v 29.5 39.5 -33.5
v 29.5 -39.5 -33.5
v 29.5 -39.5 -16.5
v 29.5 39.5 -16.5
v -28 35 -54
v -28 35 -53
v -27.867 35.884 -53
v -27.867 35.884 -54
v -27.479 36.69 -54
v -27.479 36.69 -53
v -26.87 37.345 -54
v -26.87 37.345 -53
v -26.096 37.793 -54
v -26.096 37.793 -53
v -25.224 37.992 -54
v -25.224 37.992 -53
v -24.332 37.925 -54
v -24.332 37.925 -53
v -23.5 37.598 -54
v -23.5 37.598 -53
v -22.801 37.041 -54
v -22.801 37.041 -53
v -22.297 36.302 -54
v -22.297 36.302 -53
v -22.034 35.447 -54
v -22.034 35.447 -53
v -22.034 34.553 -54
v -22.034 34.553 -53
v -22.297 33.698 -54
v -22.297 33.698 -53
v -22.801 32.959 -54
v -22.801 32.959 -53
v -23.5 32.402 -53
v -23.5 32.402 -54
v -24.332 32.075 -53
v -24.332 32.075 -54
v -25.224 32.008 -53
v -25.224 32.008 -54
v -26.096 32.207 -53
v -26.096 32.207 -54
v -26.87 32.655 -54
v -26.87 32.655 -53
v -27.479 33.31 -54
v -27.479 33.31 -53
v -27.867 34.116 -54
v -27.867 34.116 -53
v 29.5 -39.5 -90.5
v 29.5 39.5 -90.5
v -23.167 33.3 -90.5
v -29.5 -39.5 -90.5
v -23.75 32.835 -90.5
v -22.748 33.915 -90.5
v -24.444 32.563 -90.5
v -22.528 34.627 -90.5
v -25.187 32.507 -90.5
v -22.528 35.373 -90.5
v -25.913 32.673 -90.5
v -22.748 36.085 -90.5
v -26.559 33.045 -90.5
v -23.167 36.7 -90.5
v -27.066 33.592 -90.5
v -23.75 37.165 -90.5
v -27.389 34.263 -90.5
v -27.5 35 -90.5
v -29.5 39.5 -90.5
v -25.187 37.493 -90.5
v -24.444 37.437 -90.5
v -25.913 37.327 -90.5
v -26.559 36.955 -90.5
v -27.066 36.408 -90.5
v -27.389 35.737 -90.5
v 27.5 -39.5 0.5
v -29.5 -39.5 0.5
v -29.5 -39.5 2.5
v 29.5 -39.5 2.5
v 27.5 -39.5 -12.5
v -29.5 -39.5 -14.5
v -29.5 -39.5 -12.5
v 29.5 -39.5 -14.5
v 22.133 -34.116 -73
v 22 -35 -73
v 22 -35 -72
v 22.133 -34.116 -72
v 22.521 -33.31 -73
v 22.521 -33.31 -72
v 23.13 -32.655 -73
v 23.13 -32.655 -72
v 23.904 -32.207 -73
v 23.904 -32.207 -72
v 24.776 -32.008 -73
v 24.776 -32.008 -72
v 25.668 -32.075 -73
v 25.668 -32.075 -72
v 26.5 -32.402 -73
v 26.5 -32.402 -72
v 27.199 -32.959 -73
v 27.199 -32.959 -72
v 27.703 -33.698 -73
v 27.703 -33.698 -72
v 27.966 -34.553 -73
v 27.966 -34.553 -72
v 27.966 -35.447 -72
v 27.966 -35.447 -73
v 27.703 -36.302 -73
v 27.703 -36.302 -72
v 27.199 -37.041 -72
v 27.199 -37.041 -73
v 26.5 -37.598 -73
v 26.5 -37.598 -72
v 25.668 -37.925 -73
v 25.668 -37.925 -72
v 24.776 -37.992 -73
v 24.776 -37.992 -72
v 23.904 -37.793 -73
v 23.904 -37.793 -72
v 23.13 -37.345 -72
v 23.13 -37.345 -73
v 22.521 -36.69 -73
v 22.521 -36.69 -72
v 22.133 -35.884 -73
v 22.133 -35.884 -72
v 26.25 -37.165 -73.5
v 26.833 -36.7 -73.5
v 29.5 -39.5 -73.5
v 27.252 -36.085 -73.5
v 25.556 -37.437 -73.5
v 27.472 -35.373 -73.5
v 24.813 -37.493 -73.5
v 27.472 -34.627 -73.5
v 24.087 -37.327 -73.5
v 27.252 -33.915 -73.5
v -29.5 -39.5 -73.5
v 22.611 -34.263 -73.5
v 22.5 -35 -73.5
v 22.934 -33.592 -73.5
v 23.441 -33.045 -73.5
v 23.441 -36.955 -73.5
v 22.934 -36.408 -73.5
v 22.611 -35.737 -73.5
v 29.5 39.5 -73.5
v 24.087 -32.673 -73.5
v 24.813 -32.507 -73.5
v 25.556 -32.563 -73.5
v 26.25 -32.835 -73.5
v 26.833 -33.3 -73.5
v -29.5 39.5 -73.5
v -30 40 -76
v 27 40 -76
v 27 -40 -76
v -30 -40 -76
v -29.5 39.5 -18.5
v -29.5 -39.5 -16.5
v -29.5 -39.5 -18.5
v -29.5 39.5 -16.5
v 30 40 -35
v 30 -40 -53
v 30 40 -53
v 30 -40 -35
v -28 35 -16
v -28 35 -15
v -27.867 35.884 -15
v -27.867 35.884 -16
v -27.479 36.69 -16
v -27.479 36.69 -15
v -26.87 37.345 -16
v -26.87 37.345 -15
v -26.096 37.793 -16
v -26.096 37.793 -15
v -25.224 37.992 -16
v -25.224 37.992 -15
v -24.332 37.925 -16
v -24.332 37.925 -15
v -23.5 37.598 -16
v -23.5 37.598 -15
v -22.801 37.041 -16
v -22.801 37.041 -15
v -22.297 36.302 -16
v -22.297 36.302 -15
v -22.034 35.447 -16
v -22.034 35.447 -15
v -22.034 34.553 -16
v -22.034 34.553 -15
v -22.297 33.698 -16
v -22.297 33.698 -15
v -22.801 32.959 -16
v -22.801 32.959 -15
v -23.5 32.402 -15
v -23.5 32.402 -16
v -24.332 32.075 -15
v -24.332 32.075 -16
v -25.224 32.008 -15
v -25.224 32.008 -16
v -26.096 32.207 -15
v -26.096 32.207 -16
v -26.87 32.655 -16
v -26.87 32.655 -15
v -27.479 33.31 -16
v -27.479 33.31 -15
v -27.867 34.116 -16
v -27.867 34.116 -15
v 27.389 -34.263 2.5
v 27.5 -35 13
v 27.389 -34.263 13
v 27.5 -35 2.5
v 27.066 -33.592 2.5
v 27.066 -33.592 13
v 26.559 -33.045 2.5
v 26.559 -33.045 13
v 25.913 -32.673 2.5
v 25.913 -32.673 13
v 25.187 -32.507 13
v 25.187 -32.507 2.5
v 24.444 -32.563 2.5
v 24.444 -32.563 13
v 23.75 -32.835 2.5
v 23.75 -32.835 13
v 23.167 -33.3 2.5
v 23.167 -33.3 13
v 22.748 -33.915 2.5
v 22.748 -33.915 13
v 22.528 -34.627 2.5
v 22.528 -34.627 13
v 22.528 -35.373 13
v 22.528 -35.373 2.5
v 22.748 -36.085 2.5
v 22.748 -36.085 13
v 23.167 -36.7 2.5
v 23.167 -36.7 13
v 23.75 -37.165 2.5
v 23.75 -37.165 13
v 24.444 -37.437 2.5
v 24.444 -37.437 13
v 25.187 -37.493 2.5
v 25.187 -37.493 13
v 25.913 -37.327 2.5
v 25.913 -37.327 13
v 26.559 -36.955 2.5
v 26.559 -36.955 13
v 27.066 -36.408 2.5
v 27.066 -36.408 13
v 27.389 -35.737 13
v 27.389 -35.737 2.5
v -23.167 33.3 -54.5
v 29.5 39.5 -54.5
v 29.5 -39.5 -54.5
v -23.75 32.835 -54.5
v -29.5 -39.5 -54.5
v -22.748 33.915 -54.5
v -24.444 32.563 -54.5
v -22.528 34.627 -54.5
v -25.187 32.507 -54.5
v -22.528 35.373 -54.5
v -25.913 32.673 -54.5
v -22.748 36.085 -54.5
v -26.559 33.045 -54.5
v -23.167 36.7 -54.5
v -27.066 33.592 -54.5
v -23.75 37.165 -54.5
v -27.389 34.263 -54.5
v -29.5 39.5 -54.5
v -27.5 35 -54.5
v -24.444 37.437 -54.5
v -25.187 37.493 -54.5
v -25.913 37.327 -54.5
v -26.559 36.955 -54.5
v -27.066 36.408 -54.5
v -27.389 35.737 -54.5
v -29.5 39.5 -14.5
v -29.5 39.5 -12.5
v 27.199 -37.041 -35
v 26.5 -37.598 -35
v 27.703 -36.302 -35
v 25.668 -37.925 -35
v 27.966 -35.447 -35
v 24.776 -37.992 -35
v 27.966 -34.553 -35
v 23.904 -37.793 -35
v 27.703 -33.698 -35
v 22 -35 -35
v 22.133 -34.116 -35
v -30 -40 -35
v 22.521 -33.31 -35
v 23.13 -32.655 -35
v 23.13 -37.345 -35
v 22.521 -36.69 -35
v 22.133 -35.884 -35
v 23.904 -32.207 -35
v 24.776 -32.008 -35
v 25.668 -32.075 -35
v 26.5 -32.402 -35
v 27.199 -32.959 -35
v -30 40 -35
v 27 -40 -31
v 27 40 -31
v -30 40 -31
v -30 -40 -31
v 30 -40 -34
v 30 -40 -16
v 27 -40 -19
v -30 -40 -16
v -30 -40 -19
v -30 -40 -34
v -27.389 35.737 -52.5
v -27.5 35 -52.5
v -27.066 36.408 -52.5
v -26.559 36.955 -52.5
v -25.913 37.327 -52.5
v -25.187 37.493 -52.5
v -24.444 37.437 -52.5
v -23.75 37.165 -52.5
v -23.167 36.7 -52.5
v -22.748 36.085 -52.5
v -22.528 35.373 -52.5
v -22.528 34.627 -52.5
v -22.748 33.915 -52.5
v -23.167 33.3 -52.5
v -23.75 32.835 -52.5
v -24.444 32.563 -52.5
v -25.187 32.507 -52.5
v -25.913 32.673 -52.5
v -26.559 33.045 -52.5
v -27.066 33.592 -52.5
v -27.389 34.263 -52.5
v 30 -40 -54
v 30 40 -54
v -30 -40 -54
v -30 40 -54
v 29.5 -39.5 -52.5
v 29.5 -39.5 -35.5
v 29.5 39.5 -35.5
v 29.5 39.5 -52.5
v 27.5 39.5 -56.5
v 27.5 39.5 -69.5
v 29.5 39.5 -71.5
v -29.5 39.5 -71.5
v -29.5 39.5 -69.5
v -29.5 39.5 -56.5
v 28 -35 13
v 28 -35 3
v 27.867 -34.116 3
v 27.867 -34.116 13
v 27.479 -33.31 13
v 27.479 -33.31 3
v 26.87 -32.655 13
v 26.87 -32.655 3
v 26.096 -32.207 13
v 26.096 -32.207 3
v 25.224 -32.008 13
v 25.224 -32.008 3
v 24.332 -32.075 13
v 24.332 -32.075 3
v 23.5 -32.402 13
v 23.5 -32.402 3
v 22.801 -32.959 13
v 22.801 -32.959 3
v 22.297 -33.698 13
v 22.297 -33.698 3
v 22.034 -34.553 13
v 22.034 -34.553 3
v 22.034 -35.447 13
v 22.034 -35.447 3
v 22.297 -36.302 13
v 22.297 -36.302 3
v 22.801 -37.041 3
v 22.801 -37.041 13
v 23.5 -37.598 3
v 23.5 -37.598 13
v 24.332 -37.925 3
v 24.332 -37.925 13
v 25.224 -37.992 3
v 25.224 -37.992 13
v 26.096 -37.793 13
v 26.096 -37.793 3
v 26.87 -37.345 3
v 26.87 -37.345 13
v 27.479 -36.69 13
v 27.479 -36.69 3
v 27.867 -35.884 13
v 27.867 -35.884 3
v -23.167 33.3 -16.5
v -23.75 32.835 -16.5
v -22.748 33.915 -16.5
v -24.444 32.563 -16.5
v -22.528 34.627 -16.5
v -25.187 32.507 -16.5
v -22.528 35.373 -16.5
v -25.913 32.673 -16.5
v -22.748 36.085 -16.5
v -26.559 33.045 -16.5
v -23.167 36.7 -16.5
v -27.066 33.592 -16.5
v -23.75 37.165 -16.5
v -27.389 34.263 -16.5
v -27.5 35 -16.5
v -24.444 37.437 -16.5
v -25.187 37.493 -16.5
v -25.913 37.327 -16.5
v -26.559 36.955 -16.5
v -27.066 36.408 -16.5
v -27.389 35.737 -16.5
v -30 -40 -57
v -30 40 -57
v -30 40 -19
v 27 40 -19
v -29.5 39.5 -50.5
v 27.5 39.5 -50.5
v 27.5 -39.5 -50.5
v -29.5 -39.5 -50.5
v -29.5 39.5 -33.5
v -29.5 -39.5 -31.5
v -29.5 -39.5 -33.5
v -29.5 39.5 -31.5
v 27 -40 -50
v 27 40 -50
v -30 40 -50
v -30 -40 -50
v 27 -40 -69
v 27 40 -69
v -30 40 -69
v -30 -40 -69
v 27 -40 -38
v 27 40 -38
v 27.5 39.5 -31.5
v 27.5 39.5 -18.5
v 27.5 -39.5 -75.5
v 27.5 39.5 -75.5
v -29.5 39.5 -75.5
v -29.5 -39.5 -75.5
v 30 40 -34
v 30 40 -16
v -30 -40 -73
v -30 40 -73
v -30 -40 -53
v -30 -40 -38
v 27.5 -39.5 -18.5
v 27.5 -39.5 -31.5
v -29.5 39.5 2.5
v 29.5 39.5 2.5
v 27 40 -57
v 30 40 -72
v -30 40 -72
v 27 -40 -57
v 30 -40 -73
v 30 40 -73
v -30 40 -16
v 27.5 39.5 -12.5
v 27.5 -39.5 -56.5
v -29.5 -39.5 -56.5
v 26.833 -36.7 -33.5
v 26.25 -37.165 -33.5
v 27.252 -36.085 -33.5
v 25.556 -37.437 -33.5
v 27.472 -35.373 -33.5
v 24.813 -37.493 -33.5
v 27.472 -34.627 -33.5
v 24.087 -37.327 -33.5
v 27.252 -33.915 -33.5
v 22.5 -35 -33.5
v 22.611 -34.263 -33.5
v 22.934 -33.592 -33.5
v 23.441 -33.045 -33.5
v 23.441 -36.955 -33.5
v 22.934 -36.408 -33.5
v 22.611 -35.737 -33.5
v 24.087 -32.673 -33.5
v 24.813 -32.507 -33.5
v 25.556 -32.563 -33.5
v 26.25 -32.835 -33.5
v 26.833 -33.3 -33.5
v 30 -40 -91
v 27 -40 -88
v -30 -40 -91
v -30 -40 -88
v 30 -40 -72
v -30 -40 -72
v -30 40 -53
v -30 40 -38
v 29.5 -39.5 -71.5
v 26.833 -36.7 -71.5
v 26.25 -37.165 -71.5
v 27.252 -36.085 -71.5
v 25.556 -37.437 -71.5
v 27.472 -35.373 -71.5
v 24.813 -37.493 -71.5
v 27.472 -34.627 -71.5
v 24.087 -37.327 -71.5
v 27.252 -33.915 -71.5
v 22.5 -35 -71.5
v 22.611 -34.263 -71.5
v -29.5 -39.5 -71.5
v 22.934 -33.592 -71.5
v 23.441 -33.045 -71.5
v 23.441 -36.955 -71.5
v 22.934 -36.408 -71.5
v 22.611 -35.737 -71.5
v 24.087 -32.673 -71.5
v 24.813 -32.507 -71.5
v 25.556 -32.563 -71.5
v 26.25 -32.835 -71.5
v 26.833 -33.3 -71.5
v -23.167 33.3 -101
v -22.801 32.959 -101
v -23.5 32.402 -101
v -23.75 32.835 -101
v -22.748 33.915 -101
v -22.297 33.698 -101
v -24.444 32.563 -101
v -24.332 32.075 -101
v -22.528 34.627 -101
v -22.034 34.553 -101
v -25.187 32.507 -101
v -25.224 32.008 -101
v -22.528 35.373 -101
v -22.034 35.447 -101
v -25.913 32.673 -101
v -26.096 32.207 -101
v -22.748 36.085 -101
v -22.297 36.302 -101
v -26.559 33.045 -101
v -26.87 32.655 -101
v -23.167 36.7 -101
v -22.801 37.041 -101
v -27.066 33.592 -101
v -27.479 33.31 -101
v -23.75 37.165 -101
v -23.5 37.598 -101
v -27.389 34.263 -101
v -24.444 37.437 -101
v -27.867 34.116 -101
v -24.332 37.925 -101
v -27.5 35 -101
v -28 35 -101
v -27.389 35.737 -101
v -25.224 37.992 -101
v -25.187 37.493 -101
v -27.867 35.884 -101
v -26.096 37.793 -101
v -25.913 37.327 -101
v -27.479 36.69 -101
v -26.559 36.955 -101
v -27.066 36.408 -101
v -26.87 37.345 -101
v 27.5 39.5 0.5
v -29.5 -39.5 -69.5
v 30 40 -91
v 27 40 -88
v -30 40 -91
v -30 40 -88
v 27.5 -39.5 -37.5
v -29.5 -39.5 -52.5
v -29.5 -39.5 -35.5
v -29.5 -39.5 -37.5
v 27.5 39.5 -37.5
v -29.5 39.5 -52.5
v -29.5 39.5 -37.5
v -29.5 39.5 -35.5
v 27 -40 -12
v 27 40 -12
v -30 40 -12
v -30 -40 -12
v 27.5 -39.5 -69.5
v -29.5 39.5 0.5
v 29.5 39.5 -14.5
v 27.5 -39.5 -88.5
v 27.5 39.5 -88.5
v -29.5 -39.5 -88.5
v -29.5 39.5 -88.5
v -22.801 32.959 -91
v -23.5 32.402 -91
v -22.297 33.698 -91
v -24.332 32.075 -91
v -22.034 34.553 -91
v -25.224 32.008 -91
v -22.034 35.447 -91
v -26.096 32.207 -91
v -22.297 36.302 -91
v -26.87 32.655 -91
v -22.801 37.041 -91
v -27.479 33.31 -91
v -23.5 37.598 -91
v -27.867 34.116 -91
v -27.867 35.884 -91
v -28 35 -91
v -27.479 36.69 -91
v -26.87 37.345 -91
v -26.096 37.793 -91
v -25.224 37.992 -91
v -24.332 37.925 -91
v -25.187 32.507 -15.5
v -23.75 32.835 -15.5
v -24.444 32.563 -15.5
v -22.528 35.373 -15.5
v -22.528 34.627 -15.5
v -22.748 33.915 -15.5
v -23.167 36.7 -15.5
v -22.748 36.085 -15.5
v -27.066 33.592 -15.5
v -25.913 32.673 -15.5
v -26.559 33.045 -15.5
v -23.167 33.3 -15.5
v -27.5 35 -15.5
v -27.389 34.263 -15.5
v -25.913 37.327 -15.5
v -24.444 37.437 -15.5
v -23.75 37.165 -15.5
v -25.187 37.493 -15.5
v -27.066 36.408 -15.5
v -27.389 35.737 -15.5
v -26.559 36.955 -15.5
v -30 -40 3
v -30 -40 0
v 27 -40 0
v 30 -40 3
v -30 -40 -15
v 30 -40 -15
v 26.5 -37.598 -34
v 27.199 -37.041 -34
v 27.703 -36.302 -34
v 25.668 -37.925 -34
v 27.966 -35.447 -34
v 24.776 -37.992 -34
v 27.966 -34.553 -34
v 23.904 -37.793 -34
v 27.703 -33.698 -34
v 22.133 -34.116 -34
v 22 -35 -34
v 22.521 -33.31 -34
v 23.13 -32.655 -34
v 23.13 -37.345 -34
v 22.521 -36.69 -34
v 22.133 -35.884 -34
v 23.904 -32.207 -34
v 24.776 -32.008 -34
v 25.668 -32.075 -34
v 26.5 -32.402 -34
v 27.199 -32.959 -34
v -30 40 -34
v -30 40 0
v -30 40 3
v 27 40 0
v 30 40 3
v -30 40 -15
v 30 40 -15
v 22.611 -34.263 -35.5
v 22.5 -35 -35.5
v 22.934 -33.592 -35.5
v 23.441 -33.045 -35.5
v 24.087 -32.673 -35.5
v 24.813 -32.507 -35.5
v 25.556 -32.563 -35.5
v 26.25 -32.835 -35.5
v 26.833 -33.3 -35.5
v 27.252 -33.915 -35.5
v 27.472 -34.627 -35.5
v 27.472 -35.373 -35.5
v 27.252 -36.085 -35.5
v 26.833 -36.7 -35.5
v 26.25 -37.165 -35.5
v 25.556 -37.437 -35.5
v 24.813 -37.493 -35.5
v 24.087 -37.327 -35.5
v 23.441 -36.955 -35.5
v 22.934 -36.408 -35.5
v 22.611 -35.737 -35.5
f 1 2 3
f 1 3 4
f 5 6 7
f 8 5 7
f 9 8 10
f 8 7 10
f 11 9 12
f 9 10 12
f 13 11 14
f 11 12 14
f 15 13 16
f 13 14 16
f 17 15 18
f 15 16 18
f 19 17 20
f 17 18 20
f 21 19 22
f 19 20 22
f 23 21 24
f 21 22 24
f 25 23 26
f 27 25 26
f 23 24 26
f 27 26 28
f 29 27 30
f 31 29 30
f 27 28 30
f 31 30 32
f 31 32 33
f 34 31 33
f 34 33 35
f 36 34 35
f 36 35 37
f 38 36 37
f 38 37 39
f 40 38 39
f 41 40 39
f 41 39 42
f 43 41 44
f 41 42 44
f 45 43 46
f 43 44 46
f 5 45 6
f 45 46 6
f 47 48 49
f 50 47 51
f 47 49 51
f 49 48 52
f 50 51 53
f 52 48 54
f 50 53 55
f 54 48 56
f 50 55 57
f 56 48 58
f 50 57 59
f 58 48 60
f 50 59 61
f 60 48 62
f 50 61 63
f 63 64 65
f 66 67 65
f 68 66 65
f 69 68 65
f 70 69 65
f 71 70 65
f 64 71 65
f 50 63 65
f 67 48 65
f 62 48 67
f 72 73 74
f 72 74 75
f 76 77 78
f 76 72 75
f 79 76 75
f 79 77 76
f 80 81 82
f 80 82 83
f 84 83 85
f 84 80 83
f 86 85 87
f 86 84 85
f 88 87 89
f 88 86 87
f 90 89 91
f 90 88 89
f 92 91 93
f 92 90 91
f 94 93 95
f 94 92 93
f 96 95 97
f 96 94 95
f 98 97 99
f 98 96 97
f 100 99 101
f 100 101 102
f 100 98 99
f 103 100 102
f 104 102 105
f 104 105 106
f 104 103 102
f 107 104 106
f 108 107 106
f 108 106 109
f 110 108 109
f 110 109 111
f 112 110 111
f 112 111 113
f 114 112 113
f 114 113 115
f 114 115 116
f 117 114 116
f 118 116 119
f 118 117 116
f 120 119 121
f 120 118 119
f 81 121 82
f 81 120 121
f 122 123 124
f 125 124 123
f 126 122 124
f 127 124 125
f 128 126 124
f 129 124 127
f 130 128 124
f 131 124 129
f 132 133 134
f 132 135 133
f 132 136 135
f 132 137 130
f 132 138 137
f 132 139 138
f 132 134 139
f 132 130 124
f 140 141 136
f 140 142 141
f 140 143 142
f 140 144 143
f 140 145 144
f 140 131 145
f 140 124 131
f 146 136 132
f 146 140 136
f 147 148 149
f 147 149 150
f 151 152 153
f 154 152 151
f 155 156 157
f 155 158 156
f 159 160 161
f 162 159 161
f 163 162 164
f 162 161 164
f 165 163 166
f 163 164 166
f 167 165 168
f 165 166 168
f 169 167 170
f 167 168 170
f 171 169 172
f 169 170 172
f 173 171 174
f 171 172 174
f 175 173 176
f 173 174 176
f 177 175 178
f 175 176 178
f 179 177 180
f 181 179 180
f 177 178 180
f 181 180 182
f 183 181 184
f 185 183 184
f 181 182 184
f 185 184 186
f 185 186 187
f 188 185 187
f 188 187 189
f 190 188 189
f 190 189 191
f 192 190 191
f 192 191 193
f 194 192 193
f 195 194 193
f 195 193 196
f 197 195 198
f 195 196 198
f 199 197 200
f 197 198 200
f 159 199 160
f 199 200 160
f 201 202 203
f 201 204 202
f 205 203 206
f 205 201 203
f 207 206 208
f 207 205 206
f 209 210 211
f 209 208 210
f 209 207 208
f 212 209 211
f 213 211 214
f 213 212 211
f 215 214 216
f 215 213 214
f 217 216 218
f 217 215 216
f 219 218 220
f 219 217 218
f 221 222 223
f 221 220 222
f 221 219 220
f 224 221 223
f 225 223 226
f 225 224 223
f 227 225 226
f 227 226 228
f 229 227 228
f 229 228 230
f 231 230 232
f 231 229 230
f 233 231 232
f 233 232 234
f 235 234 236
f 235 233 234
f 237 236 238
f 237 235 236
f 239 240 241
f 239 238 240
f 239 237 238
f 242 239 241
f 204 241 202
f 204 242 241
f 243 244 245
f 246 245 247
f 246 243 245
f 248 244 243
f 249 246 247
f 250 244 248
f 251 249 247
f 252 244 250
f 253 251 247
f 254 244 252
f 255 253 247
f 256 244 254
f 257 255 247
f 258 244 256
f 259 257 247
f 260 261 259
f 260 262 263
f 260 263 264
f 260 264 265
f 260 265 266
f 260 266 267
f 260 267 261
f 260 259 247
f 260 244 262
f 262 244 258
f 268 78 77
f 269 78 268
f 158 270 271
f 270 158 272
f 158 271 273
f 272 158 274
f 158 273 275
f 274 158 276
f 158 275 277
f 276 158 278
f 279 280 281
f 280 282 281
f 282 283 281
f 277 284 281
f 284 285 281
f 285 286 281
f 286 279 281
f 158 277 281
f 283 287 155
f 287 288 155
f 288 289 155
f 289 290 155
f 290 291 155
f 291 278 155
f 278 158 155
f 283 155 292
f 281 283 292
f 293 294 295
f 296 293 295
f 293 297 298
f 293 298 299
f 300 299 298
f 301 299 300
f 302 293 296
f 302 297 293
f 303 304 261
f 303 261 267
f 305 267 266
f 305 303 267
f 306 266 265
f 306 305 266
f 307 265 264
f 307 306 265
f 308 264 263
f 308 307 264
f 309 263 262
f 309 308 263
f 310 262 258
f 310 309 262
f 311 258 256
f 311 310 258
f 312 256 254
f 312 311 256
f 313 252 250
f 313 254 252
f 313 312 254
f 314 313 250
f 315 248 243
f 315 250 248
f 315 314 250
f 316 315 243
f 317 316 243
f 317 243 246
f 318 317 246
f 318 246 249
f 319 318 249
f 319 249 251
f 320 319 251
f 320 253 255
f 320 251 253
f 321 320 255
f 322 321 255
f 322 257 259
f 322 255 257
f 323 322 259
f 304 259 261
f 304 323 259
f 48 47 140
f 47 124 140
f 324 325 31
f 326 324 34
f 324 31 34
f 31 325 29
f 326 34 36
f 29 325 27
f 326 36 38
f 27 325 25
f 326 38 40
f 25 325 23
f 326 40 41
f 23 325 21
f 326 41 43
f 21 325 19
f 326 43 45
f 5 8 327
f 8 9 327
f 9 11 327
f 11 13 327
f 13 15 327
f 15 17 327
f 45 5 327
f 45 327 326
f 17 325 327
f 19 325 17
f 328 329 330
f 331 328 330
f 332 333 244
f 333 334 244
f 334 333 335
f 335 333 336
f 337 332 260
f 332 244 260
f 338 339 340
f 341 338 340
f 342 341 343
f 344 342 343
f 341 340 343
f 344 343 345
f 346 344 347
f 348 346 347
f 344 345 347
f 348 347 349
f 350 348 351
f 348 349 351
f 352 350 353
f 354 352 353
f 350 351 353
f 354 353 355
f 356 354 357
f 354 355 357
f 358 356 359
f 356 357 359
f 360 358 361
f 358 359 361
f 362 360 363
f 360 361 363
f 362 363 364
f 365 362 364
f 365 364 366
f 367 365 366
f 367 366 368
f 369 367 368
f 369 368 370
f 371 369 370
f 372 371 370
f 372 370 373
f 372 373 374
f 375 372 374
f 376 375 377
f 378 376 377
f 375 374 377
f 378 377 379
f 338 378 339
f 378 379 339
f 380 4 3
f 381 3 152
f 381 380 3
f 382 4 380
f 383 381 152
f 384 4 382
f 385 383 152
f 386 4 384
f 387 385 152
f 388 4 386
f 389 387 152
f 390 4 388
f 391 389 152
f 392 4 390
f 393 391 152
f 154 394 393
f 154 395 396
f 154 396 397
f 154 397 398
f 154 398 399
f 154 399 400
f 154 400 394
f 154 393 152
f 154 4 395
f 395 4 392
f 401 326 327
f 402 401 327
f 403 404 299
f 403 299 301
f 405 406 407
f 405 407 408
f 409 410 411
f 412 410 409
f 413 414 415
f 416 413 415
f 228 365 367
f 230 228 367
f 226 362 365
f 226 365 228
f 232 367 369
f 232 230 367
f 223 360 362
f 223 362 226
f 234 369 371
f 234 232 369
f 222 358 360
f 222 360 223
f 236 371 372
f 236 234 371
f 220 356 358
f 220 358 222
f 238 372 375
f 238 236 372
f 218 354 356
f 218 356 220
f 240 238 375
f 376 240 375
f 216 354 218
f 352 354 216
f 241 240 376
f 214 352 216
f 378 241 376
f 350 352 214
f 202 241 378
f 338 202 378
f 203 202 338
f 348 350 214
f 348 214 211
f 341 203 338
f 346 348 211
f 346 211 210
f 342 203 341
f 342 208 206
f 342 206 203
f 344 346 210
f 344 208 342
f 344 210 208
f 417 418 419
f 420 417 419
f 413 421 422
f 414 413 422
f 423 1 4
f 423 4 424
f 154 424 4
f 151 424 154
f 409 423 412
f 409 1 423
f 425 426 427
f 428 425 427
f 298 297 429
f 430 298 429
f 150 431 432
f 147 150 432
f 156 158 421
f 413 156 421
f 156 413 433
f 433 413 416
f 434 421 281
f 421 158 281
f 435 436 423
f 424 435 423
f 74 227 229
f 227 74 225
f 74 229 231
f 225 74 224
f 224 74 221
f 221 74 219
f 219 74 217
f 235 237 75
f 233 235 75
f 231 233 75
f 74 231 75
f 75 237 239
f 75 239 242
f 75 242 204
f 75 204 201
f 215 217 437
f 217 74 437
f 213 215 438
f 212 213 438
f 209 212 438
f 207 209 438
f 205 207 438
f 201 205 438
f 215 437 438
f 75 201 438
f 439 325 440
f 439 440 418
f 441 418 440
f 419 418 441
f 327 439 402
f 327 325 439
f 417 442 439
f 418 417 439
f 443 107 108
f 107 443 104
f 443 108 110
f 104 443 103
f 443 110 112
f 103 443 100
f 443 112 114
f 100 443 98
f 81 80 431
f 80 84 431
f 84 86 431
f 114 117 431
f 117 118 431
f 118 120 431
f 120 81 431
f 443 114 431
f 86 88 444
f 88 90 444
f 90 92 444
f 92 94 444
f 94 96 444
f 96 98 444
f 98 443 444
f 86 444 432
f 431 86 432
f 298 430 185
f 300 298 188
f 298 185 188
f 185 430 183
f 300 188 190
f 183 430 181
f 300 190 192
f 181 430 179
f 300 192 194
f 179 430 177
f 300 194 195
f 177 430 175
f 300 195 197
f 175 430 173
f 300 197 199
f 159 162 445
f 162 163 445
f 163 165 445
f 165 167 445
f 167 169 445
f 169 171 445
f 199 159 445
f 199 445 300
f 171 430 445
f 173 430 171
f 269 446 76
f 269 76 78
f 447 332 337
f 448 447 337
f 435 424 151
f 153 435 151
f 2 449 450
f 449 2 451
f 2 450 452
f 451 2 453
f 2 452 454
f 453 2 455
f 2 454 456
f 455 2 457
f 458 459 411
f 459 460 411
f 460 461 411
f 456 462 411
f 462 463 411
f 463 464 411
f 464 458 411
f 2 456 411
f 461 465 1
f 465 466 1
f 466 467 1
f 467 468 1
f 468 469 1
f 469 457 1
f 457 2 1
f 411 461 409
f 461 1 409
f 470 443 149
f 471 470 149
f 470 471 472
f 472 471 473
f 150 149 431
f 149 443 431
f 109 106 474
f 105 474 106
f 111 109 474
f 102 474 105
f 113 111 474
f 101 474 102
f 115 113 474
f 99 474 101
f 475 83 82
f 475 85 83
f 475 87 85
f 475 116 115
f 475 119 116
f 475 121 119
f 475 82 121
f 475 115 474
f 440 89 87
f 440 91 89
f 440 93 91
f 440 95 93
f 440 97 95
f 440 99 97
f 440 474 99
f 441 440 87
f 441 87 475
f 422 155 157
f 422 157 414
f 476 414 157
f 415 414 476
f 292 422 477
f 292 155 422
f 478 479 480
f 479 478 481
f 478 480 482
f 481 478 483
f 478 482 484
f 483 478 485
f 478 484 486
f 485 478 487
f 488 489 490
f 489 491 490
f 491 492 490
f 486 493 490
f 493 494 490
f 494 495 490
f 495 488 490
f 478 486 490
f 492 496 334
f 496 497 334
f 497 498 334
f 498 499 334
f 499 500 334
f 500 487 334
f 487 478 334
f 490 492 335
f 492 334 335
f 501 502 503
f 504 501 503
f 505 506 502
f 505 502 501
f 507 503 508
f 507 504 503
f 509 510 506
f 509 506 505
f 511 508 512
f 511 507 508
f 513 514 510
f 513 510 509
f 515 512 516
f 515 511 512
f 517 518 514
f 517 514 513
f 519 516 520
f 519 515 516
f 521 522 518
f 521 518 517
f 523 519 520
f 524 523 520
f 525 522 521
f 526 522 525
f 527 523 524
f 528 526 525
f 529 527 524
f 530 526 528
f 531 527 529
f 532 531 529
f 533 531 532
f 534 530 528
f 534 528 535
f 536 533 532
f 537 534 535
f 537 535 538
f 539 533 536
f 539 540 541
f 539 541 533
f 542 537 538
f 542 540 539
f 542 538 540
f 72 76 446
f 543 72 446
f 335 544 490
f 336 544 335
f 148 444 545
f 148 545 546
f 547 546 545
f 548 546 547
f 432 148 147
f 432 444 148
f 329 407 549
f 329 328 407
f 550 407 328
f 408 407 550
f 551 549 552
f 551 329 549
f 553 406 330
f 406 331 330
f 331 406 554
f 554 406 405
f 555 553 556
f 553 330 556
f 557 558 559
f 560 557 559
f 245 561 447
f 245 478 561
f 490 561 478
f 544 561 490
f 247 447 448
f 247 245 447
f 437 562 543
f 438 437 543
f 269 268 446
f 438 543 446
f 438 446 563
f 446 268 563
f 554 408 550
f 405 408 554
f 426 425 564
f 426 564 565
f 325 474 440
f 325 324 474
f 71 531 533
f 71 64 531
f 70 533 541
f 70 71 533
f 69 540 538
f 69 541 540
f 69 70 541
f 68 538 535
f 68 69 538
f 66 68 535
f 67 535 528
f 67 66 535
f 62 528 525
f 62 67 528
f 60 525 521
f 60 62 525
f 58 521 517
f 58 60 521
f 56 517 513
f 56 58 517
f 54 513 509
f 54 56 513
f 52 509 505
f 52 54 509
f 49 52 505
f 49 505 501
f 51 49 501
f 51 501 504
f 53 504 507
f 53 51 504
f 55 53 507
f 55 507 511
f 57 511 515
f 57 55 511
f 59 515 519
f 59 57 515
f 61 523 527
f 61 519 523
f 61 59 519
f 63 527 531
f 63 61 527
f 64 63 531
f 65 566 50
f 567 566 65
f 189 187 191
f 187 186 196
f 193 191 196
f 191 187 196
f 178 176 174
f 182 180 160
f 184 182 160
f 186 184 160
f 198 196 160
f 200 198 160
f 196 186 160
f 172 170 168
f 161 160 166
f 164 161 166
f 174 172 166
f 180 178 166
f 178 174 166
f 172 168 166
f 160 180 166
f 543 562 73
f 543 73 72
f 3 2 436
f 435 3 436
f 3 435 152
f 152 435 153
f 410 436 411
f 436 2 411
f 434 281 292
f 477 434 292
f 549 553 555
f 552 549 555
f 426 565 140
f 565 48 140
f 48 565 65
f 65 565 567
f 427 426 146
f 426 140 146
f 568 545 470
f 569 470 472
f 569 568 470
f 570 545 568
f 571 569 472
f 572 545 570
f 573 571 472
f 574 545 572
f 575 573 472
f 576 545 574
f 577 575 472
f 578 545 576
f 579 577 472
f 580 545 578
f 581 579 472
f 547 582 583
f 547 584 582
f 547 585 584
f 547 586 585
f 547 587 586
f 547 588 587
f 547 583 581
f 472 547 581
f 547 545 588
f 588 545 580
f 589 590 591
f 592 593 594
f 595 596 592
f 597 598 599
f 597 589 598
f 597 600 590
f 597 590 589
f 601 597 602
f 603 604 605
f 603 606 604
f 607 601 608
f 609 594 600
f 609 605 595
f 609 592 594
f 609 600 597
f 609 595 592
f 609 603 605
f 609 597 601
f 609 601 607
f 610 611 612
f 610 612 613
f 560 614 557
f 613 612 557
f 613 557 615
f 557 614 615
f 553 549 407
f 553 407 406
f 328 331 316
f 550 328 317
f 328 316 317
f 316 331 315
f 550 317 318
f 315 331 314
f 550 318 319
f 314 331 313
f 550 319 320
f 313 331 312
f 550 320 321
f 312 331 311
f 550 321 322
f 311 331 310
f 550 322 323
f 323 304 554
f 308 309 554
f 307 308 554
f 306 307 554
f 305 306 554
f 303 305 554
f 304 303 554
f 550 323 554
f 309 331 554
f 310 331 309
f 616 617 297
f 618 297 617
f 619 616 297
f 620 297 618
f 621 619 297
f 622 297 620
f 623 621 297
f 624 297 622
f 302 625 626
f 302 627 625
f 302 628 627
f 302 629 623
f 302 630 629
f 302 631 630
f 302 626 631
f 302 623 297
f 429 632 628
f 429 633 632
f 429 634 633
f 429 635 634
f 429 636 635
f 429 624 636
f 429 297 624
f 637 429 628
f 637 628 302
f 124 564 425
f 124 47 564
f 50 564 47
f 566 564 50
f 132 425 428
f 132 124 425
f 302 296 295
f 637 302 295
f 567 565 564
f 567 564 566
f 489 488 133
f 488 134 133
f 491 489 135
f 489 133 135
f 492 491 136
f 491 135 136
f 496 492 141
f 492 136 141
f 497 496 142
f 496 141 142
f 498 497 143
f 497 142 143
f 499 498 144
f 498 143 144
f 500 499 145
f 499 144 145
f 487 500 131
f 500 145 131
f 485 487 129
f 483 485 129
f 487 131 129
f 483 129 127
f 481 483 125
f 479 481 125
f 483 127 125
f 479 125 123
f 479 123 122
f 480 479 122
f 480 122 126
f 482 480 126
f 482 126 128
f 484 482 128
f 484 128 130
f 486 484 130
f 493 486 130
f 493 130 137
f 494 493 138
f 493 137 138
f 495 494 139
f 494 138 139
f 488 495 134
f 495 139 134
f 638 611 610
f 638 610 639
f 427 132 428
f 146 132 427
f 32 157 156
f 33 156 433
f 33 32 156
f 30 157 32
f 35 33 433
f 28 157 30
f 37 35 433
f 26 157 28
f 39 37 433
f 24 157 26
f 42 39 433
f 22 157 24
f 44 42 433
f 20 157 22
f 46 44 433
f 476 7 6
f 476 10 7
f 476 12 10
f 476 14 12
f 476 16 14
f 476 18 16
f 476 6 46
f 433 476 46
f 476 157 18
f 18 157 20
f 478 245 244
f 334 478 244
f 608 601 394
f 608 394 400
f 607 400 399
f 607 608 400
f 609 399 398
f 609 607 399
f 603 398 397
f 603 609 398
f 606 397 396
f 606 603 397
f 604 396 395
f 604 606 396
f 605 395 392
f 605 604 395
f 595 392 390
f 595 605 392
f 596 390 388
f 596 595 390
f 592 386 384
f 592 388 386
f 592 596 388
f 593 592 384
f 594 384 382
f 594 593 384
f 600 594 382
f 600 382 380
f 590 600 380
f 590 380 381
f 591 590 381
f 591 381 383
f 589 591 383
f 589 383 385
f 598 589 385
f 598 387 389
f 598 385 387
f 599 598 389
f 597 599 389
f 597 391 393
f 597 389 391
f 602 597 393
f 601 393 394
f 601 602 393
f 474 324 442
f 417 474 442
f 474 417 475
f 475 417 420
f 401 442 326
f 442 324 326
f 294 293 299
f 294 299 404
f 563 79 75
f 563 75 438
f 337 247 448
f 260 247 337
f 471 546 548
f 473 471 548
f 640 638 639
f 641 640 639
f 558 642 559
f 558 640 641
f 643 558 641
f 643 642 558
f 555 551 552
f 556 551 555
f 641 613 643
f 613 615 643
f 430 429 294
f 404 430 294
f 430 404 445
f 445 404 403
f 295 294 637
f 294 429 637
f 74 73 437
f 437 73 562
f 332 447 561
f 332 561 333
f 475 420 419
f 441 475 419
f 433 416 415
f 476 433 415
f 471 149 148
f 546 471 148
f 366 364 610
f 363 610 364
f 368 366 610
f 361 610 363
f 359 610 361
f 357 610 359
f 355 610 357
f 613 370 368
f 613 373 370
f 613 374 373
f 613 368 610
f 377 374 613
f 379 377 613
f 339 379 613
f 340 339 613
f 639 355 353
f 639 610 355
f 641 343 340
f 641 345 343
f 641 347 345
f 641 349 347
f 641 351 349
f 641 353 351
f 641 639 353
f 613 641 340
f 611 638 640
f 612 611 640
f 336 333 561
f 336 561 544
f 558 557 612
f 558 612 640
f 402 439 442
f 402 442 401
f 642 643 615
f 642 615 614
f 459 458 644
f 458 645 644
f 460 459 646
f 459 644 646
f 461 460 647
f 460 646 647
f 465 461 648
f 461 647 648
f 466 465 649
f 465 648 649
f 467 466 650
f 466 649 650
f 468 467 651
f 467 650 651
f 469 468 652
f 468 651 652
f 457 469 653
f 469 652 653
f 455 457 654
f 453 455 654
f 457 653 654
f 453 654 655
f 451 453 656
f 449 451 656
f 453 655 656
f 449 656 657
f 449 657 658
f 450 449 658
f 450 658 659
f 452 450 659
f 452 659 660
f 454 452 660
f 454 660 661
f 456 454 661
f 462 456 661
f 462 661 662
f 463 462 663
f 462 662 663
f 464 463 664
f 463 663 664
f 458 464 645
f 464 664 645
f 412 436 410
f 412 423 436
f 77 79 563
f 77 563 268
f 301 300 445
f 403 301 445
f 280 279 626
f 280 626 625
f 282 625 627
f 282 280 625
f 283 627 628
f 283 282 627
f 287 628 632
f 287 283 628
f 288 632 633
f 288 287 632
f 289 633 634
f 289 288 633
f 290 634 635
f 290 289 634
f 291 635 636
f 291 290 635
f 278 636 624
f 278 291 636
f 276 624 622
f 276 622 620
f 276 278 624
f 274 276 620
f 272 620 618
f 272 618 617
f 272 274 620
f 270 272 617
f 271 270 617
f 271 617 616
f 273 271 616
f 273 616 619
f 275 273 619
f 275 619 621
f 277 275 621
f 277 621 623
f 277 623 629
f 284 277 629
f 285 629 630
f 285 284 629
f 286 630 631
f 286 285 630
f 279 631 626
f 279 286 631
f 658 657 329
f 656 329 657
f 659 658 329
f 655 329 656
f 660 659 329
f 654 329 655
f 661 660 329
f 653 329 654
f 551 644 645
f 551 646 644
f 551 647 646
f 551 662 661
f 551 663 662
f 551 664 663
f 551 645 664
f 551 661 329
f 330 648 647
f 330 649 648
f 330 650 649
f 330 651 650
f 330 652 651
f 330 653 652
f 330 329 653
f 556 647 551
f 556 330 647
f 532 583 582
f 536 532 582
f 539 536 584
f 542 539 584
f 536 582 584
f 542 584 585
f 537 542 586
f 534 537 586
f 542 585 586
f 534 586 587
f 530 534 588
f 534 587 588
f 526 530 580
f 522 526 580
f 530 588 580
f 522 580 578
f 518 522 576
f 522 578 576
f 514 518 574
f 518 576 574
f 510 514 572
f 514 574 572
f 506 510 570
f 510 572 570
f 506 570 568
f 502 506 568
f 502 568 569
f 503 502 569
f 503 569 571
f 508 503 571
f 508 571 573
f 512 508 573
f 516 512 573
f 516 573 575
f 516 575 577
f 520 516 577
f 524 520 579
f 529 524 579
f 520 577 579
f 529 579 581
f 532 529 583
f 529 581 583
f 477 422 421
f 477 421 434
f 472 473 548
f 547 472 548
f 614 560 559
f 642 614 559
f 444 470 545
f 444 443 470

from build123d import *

# Parameters (mm, degrees)
SKETCH_1_W       = 60
SKETCH_1_H       = 80
EXTRUDE_1_DEPTH  = 3
SKETCH_2_W       = 60
SKETCH_2_H       = 80
EXTRUDE_2_DEPTH  = 3
SKETCH_4_R       = 3
EXTRUDE_5_DEPTH  = 10
SKETCH_6_R       = 3
EXTRUDE_7_DEPTH  = 1
SKETCH_7_W       = 60
SKETCH_7_H       = 80
EXTRUDE_8_DEPTH  = 3
SKETCH_10_W      = 3
SKETCH_10_H      = 80
EXTRUDE_11_DEPTH = 12
SKETCH_11_W      = 60
SKETCH_11_H      = 80
EXTRUDE_12_DEPTH = 3
SKETCH_12_W      = 3
SKETCH_12_H      = 80
EXTRUDE_13_DEPTH = 12
EXTRUDE_START    = 1
SKETCH_13_R      = 3
EXTRUDE_14_DEPTH = 1
SKETCH_14_W      = 60
SKETCH_14_H      = 80
EXTRUDE_15_DEPTH = 3
SKETCH_16_W      = 3
SKETCH_16_H      = 80
EXTRUDE_16_DEPTH = 12
SKETCH_18_W      = 60
SKETCH_18_H      = 80
EXTRUDE_17_DEPTH = 3
SKETCH_20_R      = 3
EXTRUDE_18_DEPTH = 1
SKETCH_21_W      = 60
SKETCH_21_H      = 80
EXTRUDE_19_DEPTH = 3
SKETCH_22_W      = 3
SKETCH_22_H      = 80
EXTRUDE_20_DEPTH = 12
SKETCH_23_W      = 60
SKETCH_23_H      = 80
EXTRUDE_21_DEPTH = 3
SKETCH_24_R      = 3
EXTRUDE_22_DEPTH = 1
SKETCH_25_W      = 60
SKETCH_25_H      = 80
EXTRUDE_23_DEPTH = 3
SKETCH_26_W      = 3
SKETCH_26_H      = 80
EXTRUDE_24_DEPTH = 12
SKETCH_28_W      = 60
SKETCH_28_H      = 80
EXTRUDE_25_DEPTH = 3
SKETCH_29_R      = 3
EXTRUDE_26_DEPTH = 10
SHELL_1_T        = -0.5
SHELL_2_T        = -0.5


with BuildPart() as part:
    # 草图1 → 凸台-拉伸1 (new body)
    with BuildSketch(Plane.XY):
        Rectangle(SKETCH_1_W, SKETCH_1_H)
    extrude(amount=EXTRUDE_1_DEPTH)

    # 草图4 → 凸台-拉伸5 (add)
    with BuildSketch(Plane.XY.offset(3)):
        with Locations((25, -35)):
            Circle(SKETCH_4_R)
    extrude(amount=EXTRUDE_5_DEPTH)



with BuildPart() as body_2:
    # 草图2 → 凸台-拉伸2 (new body)
    with BuildSketch(Plane(origin=(0, 0, -12), x_dir=(-1, 0, 0), z_dir=(0, 0, -1))):
        Rectangle(SKETCH_2_W, SKETCH_2_H)
    extrude(amount=EXTRUDE_2_DEPTH)


with BuildPart() as body_3:
    # 草图6 → 凸台-拉伸7 (new body)
    with BuildSketch(Plane(origin=(0, 0, -15), x_dir=(-1, 0, 0), z_dir=(0, 0, -1))):
        with Locations((25, 35)):
            Circle(SKETCH_6_R)
    extrude(amount=EXTRUDE_7_DEPTH)

    # 草图7 → 凸台-拉伸8 (add)
    with BuildSketch(Plane(origin=(0, 0, -16), x_dir=(-1, 0, 0), z_dir=(0, 0, -1))):
        Rectangle(SKETCH_7_W, SKETCH_7_H)
    extrude(amount=EXTRUDE_8_DEPTH)



with BuildPart() as part_1:
    add(part.part)

    add(body_2.part)  # 凸台-拉伸11 merges body 2
    # 草图10 → 凸台-拉伸11 (add)
    with BuildSketch(Plane.XY.offset(-12)):
        with Locations((28.5, 0)):
            Rectangle(SKETCH_10_W, SKETCH_10_H)
    extrude(amount=EXTRUDE_11_DEPTH)

    # 抽壳1
    shell_1_openings = [part_1.faces().sort_by_distance(p)[0] for p in [
        (25, -35, 13),
    ]]
    offset(amount=SHELL_1_T, openings=shell_1_openings, kind=Kind.INTERSECTION)


with BuildPart() as body_3_2:
    # 草图11 → 凸台-拉伸12 (new body)
    with BuildSketch(Plane(origin=(0, 0, -31), x_dir=(-1, 0, 0), z_dir=(0, 0, -1))):
        Rectangle(SKETCH_11_W, SKETCH_11_H)
    extrude(amount=EXTRUDE_12_DEPTH)


with BuildPart() as body_3_1:
    add(body_3.part)

    add(body_3_2.part)  # 凸台-拉伸13 merges body 3 2
    # 草图12 → 凸台-拉伸13 (add)
    with BuildSketch(Plane(origin=(0, 0, -31), x_dir=(-1, 0, 0), z_dir=(0, 0, -1))):
        with Locations((-28.5, 0)):
            Rectangle(SKETCH_12_W, SKETCH_12_H)
    extrude(amount=-EXTRUDE_13_DEPTH)

    # 草图13 → 凸台-拉伸14 (add)
    with BuildSketch(Plane(origin=(0, 0, -34), x_dir=(-1, 0, 0), z_dir=(0, 0, -1)).offset(EXTRUDE_START)):
        with Locations((-25, -35)):
            Circle(SKETCH_13_R)
    extrude(amount=-EXTRUDE_14_DEPTH)

    # 草图14 → 凸台-拉伸15 (add)
    with BuildSketch(Plane(origin=(0, 0, -35), x_dir=(-1, 0, 0), z_dir=(0, 0, -1))):
        Rectangle(SKETCH_14_W, SKETCH_14_H)
    extrude(amount=EXTRUDE_15_DEPTH)

    # 草图16 → 凸台-拉伸16 (add)
    with BuildSketch(Plane(origin=(0, 0, -38), x_dir=(-1, 0, 0), z_dir=(0, 0, -1))):
        with Locations((-28.5, 0)):
            Rectangle(SKETCH_16_W, SKETCH_16_H)
    extrude(amount=EXTRUDE_16_DEPTH)

    # 草图18 → 凸台-拉伸17 (add)
    with BuildSketch(Plane(origin=(0, 0, -50), x_dir=(-1, 0, 0), z_dir=(0, 0, -1))):
        Rectangle(SKETCH_18_W, SKETCH_18_H)
    extrude(amount=EXTRUDE_17_DEPTH)

    # 草图20 → 凸台-拉伸18 (add)
    with BuildSketch(Plane(origin=(0, 0, -53), x_dir=(-1, 0, 0), z_dir=(0, 0, -1))):
        with Locations((25, 35)):
            Circle(SKETCH_20_R)
    extrude(amount=EXTRUDE_18_DEPTH)

    # 草图21 → 凸台-拉伸19 (add)
    with BuildSketch(Plane(origin=(0, 0, -54), x_dir=(-1, 0, 0), z_dir=(0, 0, -1))):
        Rectangle(SKETCH_21_W, SKETCH_21_H)
    extrude(amount=EXTRUDE_19_DEPTH)

    # 草图22 → 凸台-拉伸20 (add)
    with BuildSketch(Plane(origin=(0, 0, -57), x_dir=(-1, 0, 0), z_dir=(0, 0, -1))):
        with Locations((-28.5, 0)):
            Rectangle(SKETCH_22_W, SKETCH_22_H)
    extrude(amount=EXTRUDE_20_DEPTH)

    # 草图23 → 凸台-拉伸21 (add)
    with BuildSketch(Plane(origin=(0, 0, -69), x_dir=(-1, 0, 0), z_dir=(0, 0, -1))):
        Rectangle(SKETCH_23_W, SKETCH_23_H)
    extrude(amount=EXTRUDE_21_DEPTH)

    # 草图24 → 凸台-拉伸22 (add)
    with BuildSketch(Plane(origin=(0, 0, -72), x_dir=(-1, 0, 0), z_dir=(0, 0, -1)).offset(EXTRUDE_START)):
        with Locations((-25, -35)):
            Circle(SKETCH_24_R)
    extrude(amount=-EXTRUDE_22_DEPTH)

    # 草图25 → 凸台-拉伸23 (add)
    with BuildSketch(Plane(origin=(0, 0, -73), x_dir=(-1, 0, 0), z_dir=(0, 0, -1))):
        Rectangle(SKETCH_25_W, SKETCH_25_H)
    extrude(amount=EXTRUDE_23_DEPTH)

    # 草图26 → 凸台-拉伸24 (add)
    with BuildSketch(Plane(origin=(0, 0, -76), x_dir=(-1, 0, 0), z_dir=(0, 0, -1))):
        with Locations((-28.5, 0)):
            Rectangle(SKETCH_26_W, SKETCH_26_H)
    extrude(amount=EXTRUDE_24_DEPTH)

    # 草图28 → 凸台-拉伸25 (add)
    with BuildSketch(Plane(origin=(0, 0, -88), x_dir=(-1, 0, 0), z_dir=(0, 0, -1))):
        Rectangle(SKETCH_28_W, SKETCH_28_H)
    extrude(amount=EXTRUDE_25_DEPTH)

    # 草图29 → 凸台-拉伸26 (add)
    with BuildSketch(Plane(origin=(0, 0, -91), x_dir=(-1, 0, 0), z_dir=(0, 0, -1))):
        with Locations((25, 35)):
            Circle(SKETCH_29_R)
    extrude(amount=EXTRUDE_26_DEPTH)

    # 抽壳2
    shell_2_openings = [body_3_1.faces().sort_by_distance(p)[0] for p in [
        (-25, 35, -101),
    ]]
    offset(amount=SHELL_2_T, openings=shell_2_openings, kind=Kind.INTERSECTION)


solid = Compound([part_1.part, body_3_1.part])
